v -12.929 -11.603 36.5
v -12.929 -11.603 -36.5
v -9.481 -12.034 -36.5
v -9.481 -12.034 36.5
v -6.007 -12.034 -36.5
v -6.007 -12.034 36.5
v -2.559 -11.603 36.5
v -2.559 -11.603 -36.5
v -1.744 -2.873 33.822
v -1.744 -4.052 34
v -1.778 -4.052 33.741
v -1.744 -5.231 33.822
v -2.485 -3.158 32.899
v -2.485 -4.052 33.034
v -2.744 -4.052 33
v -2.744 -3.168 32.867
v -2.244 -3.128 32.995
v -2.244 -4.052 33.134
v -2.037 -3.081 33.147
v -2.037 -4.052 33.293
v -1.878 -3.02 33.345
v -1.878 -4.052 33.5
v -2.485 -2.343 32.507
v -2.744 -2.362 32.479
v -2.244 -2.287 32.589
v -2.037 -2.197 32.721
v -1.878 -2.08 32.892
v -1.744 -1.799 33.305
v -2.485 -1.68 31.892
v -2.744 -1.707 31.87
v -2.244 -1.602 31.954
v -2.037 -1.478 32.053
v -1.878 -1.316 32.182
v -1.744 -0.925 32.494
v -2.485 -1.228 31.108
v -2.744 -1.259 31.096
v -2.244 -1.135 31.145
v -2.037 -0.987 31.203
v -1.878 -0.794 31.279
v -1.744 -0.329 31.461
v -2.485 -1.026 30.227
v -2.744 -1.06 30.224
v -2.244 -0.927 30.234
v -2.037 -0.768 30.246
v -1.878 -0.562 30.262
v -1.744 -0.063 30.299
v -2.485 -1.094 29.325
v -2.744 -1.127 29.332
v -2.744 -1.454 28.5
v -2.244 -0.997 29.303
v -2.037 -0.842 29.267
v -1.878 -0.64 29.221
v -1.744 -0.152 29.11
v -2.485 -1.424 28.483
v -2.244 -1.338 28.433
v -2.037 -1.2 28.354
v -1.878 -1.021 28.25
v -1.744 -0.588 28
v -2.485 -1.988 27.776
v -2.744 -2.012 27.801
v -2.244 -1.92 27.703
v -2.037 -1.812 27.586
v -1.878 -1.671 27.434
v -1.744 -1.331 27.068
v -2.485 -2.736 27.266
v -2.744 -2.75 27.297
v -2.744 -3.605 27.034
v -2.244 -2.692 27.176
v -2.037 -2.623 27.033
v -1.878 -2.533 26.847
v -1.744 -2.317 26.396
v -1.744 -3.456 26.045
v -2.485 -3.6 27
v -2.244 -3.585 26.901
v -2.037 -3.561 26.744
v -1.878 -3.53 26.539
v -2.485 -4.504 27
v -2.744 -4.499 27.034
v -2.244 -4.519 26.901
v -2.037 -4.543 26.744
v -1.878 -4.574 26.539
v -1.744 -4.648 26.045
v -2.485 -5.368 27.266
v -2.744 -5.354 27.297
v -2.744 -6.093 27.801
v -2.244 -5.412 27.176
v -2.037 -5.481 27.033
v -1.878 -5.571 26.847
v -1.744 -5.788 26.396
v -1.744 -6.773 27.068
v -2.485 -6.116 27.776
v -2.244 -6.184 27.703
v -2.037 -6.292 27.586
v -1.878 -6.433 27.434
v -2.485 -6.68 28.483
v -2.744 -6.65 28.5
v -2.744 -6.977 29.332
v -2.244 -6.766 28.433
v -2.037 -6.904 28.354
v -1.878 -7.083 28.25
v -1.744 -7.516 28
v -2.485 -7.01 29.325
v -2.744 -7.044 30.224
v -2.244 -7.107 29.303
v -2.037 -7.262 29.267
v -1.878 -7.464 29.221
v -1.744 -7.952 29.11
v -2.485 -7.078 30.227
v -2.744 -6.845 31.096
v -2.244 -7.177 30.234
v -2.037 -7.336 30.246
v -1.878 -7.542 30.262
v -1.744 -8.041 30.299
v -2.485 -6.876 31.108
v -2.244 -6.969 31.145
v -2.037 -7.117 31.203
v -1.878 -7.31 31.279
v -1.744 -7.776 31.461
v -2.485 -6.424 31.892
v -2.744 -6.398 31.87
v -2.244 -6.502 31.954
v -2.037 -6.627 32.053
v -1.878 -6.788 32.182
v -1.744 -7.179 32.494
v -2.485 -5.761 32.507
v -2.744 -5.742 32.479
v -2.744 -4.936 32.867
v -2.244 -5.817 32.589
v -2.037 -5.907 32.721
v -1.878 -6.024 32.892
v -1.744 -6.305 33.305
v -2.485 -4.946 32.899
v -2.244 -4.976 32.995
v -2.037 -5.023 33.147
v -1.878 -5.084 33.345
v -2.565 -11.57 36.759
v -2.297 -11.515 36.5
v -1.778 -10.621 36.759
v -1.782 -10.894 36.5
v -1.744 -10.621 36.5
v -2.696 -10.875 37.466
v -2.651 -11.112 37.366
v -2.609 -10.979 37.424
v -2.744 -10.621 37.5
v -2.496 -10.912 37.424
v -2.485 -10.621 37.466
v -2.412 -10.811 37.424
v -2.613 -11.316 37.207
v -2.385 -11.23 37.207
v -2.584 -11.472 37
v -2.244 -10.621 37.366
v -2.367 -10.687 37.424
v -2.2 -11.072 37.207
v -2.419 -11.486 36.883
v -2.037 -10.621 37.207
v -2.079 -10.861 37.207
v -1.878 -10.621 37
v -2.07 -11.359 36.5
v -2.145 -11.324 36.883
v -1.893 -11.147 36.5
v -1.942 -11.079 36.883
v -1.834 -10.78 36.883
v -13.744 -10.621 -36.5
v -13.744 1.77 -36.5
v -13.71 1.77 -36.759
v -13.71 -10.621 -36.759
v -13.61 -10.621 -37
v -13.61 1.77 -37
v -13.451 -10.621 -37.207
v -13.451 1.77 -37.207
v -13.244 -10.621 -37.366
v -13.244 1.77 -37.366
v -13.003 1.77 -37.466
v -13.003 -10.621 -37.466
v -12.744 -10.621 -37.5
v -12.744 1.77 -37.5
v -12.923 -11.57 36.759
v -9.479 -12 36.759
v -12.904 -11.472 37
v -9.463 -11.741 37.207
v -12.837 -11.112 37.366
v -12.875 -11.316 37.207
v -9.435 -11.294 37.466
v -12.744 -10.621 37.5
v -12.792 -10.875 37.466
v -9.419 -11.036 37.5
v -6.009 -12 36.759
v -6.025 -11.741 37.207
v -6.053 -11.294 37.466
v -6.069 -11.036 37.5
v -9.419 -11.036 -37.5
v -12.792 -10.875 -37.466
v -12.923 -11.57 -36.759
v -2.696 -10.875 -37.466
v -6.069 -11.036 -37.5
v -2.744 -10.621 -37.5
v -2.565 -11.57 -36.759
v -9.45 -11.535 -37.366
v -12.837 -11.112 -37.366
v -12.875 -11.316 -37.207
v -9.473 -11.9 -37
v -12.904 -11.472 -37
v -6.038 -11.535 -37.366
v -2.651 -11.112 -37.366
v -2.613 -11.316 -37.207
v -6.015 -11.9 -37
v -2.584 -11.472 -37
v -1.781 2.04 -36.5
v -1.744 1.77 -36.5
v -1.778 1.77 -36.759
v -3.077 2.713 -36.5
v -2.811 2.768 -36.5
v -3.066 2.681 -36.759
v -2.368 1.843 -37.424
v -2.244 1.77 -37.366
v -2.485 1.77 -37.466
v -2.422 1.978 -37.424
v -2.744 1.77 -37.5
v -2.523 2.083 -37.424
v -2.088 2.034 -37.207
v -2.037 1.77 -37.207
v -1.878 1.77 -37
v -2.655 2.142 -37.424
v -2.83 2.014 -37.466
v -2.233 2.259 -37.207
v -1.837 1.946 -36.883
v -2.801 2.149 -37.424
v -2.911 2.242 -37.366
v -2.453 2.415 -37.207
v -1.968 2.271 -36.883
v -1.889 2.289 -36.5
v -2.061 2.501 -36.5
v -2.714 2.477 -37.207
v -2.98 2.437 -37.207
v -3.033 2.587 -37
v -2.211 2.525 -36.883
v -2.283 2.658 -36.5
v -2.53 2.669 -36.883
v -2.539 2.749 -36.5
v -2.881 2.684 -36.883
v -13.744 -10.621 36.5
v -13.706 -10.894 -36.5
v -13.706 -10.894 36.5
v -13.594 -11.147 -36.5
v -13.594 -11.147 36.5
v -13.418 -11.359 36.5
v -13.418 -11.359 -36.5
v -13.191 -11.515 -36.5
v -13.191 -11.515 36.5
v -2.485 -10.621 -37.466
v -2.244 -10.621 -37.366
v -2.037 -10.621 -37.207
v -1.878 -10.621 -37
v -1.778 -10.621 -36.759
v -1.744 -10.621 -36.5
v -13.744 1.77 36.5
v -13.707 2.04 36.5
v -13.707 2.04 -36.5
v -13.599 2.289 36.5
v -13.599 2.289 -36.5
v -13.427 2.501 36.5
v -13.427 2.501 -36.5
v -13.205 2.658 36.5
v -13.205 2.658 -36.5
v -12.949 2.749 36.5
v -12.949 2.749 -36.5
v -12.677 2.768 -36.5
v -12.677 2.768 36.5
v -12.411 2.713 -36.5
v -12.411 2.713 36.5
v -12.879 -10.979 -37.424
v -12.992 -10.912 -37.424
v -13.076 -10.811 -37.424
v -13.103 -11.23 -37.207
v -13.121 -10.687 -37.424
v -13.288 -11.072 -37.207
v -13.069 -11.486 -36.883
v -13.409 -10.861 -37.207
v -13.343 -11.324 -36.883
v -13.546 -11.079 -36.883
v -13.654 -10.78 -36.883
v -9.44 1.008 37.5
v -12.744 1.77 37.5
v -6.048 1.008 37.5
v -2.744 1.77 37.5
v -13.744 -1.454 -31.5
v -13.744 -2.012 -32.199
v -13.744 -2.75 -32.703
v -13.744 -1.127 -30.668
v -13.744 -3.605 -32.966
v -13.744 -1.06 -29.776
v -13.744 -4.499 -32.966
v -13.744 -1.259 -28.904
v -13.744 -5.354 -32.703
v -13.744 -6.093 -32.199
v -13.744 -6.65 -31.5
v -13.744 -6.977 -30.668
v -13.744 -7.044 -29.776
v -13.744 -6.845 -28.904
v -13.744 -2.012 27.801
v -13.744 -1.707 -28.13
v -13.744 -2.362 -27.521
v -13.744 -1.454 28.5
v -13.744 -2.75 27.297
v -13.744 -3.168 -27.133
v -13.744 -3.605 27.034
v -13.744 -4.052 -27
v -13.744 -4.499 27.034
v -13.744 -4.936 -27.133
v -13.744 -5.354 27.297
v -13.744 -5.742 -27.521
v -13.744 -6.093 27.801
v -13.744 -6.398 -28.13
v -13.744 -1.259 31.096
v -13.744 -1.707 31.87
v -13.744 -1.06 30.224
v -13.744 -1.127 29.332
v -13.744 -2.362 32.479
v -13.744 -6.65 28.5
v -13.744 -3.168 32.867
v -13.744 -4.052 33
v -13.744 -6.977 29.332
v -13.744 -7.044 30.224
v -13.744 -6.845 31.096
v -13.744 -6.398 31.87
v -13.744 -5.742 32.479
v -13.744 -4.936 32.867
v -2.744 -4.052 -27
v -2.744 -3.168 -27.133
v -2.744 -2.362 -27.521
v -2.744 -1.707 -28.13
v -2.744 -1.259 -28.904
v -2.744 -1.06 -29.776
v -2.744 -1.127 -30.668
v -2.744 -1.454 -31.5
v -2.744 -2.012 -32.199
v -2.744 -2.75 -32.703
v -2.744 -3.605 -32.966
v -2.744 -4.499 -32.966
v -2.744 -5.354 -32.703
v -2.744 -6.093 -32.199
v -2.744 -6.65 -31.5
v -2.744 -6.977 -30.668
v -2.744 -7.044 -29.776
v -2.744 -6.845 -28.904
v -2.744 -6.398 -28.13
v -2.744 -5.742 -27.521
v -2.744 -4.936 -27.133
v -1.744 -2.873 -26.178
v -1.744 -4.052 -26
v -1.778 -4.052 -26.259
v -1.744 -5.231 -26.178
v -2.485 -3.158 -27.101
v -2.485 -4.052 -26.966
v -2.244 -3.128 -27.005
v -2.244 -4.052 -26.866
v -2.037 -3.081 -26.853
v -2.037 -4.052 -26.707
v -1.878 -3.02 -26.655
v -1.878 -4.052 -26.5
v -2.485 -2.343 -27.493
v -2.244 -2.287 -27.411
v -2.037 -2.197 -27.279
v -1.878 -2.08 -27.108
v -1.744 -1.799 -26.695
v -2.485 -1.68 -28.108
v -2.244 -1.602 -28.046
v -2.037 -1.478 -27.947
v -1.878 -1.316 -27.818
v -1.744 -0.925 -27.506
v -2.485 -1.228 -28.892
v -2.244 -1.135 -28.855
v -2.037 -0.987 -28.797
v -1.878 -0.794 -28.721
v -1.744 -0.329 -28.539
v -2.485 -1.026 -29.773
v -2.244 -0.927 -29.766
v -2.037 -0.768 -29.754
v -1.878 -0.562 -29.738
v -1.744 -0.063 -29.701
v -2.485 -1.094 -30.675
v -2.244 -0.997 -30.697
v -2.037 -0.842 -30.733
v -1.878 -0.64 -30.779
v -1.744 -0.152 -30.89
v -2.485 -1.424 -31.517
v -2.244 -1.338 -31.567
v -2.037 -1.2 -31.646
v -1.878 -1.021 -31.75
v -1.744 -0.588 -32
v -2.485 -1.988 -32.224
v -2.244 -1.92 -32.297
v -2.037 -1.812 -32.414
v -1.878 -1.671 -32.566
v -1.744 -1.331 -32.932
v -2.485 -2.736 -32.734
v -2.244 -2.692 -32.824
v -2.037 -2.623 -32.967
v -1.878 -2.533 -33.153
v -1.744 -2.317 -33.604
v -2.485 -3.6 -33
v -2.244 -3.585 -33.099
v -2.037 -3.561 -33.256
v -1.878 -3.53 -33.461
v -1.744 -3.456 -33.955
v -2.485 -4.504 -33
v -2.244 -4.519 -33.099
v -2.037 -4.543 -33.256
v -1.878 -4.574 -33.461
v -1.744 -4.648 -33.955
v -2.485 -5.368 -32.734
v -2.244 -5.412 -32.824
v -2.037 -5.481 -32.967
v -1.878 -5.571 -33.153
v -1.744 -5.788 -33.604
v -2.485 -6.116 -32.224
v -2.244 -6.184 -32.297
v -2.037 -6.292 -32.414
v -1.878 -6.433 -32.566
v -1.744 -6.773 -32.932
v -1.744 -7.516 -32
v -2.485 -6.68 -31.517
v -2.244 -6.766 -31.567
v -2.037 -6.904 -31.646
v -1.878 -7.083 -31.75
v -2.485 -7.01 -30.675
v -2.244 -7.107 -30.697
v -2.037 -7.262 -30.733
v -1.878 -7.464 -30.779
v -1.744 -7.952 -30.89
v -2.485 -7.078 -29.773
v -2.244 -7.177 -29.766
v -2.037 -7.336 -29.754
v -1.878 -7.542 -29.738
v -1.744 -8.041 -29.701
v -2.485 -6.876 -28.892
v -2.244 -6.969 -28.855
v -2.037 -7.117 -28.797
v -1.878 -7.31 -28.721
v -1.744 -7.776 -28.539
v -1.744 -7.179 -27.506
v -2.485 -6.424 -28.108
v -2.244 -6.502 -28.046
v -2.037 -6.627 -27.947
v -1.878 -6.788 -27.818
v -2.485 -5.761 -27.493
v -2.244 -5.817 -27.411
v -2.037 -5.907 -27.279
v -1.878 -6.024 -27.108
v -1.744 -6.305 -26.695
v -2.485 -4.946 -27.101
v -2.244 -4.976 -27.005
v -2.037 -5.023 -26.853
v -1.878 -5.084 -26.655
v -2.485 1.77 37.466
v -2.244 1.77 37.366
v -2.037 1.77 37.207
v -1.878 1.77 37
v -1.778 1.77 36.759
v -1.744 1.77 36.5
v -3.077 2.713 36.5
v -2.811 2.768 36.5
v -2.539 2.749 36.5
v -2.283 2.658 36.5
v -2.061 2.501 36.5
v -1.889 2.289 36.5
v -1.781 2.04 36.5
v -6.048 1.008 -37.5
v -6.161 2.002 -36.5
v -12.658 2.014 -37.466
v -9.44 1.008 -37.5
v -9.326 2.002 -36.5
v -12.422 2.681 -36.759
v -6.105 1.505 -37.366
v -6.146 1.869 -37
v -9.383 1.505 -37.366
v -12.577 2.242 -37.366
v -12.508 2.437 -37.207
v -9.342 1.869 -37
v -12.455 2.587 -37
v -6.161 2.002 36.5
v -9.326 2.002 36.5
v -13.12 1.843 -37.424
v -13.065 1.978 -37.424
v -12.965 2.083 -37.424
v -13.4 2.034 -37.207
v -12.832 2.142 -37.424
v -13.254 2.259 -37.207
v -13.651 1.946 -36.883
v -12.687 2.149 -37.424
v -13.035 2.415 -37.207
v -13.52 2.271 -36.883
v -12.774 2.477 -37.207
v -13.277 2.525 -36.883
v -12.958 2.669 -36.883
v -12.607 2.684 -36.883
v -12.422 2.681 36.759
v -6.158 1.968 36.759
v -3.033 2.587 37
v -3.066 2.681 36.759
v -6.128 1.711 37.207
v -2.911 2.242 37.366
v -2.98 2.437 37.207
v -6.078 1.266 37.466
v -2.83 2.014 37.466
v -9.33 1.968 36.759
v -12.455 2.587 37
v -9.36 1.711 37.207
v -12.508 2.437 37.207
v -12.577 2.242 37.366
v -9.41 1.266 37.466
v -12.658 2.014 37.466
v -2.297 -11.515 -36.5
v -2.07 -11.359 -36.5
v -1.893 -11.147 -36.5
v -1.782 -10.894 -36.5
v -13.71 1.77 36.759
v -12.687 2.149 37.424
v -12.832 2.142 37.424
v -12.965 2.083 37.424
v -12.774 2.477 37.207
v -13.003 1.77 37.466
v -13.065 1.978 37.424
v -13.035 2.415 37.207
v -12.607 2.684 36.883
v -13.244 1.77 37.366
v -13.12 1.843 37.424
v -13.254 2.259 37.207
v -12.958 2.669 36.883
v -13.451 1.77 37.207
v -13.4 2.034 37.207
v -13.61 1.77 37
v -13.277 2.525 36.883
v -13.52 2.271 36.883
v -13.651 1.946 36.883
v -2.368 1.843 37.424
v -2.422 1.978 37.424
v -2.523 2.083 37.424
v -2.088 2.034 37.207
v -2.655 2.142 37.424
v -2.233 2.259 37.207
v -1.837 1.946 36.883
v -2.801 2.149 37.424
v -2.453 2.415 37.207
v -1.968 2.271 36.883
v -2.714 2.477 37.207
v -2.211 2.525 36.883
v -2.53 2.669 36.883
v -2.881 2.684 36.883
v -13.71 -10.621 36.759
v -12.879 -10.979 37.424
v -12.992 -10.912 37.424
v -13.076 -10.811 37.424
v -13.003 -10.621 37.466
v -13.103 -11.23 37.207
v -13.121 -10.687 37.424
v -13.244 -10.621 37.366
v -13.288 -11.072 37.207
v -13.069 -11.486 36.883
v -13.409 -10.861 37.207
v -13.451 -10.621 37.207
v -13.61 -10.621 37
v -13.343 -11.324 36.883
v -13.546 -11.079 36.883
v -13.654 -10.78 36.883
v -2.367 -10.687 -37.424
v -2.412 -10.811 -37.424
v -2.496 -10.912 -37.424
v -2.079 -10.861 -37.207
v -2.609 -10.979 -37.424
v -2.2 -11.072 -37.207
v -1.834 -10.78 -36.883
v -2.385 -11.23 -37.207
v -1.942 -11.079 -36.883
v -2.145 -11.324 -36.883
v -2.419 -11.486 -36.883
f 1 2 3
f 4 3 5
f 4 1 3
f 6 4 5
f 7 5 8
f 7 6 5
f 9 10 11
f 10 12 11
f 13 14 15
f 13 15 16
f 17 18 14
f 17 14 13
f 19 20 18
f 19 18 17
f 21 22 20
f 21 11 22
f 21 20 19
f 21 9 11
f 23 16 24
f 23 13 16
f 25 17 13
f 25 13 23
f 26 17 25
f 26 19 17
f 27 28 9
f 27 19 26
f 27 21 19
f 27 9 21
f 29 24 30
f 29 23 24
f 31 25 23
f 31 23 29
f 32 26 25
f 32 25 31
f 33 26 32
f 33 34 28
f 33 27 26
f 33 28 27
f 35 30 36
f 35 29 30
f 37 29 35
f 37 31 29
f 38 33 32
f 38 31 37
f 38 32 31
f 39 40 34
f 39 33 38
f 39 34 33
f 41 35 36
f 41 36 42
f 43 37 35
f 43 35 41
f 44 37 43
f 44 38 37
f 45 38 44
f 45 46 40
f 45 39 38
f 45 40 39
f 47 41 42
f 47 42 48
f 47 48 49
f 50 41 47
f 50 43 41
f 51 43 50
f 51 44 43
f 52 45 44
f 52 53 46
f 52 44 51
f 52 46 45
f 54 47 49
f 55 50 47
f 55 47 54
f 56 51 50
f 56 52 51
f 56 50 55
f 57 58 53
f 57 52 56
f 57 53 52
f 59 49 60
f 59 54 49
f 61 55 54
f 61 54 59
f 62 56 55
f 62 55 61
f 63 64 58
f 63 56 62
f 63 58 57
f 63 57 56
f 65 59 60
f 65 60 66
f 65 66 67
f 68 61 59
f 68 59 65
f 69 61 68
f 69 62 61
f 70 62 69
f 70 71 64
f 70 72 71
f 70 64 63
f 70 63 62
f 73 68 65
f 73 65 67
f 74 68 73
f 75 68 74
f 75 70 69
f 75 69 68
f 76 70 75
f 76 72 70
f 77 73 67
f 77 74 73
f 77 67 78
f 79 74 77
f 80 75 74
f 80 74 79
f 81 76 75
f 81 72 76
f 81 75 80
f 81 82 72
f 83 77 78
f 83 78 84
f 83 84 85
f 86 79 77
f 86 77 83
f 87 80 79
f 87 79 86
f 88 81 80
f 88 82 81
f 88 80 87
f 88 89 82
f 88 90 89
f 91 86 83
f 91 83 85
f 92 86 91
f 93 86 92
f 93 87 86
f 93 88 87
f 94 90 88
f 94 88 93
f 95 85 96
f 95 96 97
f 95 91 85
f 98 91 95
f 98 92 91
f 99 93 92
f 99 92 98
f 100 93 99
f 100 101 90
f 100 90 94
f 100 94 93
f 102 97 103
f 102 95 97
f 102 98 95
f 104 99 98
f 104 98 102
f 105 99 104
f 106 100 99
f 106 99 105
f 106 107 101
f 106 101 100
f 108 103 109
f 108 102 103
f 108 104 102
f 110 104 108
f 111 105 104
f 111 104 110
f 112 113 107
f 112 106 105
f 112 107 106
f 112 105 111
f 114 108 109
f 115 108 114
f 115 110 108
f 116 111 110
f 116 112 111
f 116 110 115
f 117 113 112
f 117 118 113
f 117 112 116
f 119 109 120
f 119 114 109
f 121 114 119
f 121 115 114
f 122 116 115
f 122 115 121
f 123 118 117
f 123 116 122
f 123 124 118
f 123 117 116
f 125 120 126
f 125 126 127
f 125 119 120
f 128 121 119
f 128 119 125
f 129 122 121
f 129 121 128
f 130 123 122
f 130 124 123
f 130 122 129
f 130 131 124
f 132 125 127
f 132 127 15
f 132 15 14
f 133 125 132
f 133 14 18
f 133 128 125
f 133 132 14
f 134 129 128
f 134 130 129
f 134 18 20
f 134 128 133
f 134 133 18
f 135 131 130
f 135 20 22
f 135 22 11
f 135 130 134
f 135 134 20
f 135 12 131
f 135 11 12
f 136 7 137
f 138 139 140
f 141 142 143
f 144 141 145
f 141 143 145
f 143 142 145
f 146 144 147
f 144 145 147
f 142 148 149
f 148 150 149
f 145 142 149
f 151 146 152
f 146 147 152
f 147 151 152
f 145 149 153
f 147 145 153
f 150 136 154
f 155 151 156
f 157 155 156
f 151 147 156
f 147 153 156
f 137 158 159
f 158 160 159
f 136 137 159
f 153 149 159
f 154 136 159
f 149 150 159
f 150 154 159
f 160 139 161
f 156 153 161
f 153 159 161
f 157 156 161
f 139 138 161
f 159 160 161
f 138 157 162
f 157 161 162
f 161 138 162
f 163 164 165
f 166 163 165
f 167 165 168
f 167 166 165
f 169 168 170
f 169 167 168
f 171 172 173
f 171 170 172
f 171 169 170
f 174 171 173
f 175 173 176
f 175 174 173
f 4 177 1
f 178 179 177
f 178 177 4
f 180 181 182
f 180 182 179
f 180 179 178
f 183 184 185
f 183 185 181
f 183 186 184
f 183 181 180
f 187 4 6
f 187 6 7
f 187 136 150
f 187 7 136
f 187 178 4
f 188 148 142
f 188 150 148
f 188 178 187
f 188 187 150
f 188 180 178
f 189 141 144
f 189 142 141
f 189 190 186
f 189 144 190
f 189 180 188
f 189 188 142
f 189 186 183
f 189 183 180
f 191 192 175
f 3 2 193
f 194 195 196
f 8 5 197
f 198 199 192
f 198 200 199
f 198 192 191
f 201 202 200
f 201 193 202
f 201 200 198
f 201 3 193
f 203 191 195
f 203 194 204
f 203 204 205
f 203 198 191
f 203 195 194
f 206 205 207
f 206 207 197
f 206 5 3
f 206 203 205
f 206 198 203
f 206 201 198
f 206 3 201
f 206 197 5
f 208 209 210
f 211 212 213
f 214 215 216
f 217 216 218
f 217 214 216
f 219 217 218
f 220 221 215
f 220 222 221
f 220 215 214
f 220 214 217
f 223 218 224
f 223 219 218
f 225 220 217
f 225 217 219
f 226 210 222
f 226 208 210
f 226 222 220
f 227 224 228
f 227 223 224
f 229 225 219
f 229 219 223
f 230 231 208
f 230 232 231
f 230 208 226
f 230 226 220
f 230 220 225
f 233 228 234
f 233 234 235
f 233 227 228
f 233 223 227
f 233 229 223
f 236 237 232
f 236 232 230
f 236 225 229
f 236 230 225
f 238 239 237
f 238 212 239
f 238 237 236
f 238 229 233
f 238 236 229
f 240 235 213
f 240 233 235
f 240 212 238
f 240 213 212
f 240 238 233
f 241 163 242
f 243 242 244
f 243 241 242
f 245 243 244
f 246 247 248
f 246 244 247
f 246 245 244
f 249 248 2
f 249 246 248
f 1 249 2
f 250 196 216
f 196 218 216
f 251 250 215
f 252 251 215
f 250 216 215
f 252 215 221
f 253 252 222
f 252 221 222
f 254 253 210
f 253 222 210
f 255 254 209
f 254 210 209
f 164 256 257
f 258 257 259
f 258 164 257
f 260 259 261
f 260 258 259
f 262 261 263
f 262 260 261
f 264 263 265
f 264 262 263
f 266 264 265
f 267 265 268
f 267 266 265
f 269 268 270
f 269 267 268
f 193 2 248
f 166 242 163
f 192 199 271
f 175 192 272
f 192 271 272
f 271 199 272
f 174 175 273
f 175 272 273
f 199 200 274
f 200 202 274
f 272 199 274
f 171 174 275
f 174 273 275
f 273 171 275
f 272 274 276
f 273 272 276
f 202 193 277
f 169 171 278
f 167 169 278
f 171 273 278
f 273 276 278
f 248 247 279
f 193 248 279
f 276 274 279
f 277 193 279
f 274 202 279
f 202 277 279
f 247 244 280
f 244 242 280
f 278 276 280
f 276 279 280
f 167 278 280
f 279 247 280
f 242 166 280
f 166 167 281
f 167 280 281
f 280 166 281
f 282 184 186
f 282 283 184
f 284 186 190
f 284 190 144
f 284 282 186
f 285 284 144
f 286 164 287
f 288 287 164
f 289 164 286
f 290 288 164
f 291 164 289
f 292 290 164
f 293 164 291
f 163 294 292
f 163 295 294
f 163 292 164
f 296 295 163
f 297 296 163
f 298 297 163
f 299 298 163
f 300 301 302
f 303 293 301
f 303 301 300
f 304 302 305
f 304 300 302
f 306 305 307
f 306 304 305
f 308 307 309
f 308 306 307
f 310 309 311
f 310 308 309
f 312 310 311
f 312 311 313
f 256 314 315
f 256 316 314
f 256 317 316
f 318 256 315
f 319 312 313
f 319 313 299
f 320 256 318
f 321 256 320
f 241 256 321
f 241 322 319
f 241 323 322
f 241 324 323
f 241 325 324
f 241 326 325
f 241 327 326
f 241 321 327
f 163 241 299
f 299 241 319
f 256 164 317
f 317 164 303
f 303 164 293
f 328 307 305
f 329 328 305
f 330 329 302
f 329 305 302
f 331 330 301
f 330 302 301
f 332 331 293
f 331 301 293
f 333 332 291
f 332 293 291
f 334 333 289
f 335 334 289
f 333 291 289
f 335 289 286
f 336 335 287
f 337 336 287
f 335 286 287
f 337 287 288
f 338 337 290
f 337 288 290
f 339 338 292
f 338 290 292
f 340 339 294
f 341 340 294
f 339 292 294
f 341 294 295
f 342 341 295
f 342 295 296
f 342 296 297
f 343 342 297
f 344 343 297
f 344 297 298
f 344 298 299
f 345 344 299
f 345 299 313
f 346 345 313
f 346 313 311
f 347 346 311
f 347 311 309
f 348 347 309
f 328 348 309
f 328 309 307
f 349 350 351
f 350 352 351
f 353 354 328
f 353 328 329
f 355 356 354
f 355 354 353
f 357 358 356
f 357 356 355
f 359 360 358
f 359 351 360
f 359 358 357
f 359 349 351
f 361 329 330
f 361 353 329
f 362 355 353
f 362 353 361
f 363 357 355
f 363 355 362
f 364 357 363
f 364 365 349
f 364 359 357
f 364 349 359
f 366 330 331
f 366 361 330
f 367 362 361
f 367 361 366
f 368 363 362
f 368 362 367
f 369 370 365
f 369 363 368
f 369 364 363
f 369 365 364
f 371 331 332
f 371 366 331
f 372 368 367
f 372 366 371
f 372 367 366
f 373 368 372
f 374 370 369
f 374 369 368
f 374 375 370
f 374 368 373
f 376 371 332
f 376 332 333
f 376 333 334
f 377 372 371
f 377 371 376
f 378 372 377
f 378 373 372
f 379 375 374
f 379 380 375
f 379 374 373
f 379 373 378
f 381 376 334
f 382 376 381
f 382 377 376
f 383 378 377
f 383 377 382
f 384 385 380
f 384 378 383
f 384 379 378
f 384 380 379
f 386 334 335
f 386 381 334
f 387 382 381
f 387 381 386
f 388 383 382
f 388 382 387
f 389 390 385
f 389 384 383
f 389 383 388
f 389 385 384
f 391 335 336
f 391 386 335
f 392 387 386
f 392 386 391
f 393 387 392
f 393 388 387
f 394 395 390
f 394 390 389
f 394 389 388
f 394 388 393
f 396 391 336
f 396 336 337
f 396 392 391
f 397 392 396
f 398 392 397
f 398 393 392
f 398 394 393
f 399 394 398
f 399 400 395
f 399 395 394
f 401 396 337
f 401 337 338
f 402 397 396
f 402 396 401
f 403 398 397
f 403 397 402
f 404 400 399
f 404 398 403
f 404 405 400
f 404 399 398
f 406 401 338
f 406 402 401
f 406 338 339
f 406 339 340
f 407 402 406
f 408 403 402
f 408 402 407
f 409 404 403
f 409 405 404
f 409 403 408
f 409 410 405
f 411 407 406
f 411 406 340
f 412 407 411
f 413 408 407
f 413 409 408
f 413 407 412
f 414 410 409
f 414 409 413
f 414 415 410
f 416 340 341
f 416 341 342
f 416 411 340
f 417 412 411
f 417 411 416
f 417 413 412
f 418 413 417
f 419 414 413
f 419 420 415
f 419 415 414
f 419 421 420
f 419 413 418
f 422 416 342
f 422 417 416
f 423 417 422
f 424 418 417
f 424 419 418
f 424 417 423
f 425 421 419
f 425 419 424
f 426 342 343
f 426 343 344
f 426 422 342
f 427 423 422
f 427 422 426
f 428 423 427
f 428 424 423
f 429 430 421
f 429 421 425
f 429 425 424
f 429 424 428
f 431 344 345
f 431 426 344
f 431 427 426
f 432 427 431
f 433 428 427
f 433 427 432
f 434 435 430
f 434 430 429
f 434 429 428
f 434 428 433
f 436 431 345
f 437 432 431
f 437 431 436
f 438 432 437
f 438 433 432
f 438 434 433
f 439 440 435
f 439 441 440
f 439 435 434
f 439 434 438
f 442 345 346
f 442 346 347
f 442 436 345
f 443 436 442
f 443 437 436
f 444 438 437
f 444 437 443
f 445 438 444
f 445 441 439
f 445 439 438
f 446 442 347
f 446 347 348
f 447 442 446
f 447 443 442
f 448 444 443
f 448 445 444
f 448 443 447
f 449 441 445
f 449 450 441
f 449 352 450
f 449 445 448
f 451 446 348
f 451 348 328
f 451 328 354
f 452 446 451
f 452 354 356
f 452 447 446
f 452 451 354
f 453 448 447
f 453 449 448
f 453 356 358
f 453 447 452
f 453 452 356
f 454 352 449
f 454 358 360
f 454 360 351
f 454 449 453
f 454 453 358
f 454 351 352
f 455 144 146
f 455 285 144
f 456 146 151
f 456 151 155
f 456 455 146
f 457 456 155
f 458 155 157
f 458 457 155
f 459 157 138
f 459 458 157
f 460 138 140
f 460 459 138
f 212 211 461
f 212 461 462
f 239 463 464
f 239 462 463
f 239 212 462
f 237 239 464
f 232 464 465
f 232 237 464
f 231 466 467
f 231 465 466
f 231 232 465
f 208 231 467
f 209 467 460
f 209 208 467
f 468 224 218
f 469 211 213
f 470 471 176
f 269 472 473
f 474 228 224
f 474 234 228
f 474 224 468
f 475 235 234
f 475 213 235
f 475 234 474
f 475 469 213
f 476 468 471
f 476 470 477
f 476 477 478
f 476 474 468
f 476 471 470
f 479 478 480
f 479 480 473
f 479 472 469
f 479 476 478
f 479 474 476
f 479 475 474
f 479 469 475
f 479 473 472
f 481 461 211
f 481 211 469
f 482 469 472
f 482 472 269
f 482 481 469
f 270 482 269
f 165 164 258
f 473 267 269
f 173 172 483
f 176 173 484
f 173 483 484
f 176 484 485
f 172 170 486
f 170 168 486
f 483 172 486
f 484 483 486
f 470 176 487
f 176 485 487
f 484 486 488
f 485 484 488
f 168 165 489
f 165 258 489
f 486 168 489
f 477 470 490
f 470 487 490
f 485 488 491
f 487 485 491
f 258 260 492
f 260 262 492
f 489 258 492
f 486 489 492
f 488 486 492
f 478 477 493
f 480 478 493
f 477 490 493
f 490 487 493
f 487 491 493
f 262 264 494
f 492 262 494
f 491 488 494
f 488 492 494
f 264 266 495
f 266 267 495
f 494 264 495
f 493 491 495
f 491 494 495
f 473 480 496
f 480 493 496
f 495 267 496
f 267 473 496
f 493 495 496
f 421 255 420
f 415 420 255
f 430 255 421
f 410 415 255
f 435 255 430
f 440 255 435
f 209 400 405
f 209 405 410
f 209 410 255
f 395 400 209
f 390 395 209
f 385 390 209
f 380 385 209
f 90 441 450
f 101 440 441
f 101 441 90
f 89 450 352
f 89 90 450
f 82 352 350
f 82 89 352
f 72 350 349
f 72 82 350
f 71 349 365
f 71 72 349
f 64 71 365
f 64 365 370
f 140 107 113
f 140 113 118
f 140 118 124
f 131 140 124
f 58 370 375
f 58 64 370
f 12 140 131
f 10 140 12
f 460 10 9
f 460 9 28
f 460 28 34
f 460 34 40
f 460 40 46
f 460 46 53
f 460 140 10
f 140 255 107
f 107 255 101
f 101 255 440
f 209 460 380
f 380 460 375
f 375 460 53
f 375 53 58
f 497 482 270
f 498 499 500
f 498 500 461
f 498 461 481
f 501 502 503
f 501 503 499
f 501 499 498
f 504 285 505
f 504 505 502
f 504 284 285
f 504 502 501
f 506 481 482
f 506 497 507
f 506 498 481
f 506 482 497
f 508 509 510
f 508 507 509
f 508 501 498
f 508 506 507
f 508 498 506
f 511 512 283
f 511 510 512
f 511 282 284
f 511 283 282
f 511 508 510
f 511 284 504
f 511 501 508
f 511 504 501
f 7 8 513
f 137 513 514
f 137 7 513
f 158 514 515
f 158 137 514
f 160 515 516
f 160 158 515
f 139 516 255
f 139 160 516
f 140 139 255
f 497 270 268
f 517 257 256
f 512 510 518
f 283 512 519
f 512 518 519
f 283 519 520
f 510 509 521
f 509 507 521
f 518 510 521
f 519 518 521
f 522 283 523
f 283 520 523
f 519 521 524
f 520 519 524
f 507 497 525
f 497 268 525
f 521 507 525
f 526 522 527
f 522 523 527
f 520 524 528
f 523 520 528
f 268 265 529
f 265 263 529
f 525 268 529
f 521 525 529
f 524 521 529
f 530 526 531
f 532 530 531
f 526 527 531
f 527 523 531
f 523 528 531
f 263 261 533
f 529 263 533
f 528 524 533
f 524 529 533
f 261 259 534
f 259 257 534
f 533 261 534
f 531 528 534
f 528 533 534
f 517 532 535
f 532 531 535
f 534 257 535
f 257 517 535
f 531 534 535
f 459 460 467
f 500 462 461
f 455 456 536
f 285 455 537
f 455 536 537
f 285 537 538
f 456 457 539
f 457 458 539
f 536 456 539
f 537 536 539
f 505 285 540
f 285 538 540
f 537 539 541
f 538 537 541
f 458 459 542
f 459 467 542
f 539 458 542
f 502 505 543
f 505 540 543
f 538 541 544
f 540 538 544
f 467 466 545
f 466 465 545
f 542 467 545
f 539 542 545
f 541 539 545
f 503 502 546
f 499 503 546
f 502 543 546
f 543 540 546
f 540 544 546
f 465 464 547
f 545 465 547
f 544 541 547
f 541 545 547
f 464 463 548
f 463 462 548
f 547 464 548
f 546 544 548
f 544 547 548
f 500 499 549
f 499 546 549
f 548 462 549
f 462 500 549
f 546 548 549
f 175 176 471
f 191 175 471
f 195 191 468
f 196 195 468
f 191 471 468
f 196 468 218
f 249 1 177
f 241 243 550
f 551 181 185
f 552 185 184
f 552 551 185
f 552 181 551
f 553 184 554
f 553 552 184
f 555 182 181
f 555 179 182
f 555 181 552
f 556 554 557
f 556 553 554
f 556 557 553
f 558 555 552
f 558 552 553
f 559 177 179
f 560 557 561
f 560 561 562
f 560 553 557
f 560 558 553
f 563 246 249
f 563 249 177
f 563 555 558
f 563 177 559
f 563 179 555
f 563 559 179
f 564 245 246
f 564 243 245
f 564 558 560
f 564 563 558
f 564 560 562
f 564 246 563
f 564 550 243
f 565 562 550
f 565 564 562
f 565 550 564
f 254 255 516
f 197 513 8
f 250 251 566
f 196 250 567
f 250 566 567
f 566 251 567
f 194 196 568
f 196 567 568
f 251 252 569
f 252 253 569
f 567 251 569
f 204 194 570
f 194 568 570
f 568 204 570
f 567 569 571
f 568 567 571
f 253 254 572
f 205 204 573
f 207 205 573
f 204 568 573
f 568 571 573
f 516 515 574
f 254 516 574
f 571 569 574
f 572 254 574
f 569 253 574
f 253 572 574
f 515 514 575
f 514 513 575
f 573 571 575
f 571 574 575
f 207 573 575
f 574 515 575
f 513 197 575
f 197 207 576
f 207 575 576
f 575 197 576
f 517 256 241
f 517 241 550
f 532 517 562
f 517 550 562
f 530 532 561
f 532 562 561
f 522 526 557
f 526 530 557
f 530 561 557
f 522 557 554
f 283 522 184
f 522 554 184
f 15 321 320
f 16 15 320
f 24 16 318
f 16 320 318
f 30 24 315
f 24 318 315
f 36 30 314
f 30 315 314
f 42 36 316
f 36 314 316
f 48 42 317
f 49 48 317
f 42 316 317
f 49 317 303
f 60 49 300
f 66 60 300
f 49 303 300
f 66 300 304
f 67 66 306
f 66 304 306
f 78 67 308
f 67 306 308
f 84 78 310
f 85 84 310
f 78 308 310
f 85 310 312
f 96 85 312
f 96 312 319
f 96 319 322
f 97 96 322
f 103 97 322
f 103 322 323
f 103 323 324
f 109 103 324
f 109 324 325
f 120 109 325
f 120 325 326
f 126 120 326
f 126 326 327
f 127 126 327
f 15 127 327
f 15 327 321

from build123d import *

# Parameters (mm, degrees)
EXTRUDE_1_DEPTH     = 37.5
SKETCH_2_R          = 3
CUT_EXTRUDE_1_DEPTH = 42.186918984
FILLET_1_R          = 1


with BuildPart() as part:
    # 草图1 → 凸台-拉伸1 (new, symmetric)
    with BuildSketch(Plane.XY):
        with BuildLine():
            Line((-13.74395899, 3.263197464), (-13.74395899, -11.437280558))
            ThreePointArc((-13.74395899, -11.437280558), (-7.74395899, -12.087691895), (-1.74395899, -11.437280558))
            Line((-1.74395899, -11.437280558), (-1.74395899, 3.263197464))
            ThreePointArc((-1.74395899, 3.263197464), (-7.74395899, 1.912308105), (-13.74395899, 3.263197464))
        make_face()
    extrude(amount=EXTRUDE_1_DEPTH, both=True)

    # 草图2 → 切除-拉伸1 (cut, through all)
    with BuildSketch(Plane.ZY.offset(13.74395899)):
        with Locations((30, -4.052061943)):
            Circle(SKETCH_2_R)
        with Locations((-30, -4.052061943)):
            Circle(SKETCH_2_R)
    extrude(amount=-CUT_EXTRUDE_1_DEPTH, mode=Mode.SUBTRACT)

    # 圆角1
    fillet_1_edges = [part.edges().sort_by_distance(p)[0] for p in [
        (-7.74395899, -12.087691895, 37.5),
        (-1.74395899, -4.087041547, 37.5),
        (-1.74395899, -4.052061943, 27),
        (-1.74395899, -4.052061943, -33),
        (-7.74395899, 1.912308105, 37.5),
        (-1.74395899, -4.087041547, -37.5),
        (-7.74395899, -12.087691895, -37.5),
        (-13.74395899, -4.087041547, -37.5),
        (-7.74395899, 1.912308105, -37.5),
        (-13.74395899, -4.087041547, 37.5),
        (-1.74395899, 3.263197464, 0),
        (-1.74395899, -11.437280558, 0),
        (-13.74395899, -11.437280558, 0),
        (-13.74395899, 3.263197464, 0),
    ]]
    fillet(fillet_1_edges, radius=FILLET_1_R)


solid = part.part
